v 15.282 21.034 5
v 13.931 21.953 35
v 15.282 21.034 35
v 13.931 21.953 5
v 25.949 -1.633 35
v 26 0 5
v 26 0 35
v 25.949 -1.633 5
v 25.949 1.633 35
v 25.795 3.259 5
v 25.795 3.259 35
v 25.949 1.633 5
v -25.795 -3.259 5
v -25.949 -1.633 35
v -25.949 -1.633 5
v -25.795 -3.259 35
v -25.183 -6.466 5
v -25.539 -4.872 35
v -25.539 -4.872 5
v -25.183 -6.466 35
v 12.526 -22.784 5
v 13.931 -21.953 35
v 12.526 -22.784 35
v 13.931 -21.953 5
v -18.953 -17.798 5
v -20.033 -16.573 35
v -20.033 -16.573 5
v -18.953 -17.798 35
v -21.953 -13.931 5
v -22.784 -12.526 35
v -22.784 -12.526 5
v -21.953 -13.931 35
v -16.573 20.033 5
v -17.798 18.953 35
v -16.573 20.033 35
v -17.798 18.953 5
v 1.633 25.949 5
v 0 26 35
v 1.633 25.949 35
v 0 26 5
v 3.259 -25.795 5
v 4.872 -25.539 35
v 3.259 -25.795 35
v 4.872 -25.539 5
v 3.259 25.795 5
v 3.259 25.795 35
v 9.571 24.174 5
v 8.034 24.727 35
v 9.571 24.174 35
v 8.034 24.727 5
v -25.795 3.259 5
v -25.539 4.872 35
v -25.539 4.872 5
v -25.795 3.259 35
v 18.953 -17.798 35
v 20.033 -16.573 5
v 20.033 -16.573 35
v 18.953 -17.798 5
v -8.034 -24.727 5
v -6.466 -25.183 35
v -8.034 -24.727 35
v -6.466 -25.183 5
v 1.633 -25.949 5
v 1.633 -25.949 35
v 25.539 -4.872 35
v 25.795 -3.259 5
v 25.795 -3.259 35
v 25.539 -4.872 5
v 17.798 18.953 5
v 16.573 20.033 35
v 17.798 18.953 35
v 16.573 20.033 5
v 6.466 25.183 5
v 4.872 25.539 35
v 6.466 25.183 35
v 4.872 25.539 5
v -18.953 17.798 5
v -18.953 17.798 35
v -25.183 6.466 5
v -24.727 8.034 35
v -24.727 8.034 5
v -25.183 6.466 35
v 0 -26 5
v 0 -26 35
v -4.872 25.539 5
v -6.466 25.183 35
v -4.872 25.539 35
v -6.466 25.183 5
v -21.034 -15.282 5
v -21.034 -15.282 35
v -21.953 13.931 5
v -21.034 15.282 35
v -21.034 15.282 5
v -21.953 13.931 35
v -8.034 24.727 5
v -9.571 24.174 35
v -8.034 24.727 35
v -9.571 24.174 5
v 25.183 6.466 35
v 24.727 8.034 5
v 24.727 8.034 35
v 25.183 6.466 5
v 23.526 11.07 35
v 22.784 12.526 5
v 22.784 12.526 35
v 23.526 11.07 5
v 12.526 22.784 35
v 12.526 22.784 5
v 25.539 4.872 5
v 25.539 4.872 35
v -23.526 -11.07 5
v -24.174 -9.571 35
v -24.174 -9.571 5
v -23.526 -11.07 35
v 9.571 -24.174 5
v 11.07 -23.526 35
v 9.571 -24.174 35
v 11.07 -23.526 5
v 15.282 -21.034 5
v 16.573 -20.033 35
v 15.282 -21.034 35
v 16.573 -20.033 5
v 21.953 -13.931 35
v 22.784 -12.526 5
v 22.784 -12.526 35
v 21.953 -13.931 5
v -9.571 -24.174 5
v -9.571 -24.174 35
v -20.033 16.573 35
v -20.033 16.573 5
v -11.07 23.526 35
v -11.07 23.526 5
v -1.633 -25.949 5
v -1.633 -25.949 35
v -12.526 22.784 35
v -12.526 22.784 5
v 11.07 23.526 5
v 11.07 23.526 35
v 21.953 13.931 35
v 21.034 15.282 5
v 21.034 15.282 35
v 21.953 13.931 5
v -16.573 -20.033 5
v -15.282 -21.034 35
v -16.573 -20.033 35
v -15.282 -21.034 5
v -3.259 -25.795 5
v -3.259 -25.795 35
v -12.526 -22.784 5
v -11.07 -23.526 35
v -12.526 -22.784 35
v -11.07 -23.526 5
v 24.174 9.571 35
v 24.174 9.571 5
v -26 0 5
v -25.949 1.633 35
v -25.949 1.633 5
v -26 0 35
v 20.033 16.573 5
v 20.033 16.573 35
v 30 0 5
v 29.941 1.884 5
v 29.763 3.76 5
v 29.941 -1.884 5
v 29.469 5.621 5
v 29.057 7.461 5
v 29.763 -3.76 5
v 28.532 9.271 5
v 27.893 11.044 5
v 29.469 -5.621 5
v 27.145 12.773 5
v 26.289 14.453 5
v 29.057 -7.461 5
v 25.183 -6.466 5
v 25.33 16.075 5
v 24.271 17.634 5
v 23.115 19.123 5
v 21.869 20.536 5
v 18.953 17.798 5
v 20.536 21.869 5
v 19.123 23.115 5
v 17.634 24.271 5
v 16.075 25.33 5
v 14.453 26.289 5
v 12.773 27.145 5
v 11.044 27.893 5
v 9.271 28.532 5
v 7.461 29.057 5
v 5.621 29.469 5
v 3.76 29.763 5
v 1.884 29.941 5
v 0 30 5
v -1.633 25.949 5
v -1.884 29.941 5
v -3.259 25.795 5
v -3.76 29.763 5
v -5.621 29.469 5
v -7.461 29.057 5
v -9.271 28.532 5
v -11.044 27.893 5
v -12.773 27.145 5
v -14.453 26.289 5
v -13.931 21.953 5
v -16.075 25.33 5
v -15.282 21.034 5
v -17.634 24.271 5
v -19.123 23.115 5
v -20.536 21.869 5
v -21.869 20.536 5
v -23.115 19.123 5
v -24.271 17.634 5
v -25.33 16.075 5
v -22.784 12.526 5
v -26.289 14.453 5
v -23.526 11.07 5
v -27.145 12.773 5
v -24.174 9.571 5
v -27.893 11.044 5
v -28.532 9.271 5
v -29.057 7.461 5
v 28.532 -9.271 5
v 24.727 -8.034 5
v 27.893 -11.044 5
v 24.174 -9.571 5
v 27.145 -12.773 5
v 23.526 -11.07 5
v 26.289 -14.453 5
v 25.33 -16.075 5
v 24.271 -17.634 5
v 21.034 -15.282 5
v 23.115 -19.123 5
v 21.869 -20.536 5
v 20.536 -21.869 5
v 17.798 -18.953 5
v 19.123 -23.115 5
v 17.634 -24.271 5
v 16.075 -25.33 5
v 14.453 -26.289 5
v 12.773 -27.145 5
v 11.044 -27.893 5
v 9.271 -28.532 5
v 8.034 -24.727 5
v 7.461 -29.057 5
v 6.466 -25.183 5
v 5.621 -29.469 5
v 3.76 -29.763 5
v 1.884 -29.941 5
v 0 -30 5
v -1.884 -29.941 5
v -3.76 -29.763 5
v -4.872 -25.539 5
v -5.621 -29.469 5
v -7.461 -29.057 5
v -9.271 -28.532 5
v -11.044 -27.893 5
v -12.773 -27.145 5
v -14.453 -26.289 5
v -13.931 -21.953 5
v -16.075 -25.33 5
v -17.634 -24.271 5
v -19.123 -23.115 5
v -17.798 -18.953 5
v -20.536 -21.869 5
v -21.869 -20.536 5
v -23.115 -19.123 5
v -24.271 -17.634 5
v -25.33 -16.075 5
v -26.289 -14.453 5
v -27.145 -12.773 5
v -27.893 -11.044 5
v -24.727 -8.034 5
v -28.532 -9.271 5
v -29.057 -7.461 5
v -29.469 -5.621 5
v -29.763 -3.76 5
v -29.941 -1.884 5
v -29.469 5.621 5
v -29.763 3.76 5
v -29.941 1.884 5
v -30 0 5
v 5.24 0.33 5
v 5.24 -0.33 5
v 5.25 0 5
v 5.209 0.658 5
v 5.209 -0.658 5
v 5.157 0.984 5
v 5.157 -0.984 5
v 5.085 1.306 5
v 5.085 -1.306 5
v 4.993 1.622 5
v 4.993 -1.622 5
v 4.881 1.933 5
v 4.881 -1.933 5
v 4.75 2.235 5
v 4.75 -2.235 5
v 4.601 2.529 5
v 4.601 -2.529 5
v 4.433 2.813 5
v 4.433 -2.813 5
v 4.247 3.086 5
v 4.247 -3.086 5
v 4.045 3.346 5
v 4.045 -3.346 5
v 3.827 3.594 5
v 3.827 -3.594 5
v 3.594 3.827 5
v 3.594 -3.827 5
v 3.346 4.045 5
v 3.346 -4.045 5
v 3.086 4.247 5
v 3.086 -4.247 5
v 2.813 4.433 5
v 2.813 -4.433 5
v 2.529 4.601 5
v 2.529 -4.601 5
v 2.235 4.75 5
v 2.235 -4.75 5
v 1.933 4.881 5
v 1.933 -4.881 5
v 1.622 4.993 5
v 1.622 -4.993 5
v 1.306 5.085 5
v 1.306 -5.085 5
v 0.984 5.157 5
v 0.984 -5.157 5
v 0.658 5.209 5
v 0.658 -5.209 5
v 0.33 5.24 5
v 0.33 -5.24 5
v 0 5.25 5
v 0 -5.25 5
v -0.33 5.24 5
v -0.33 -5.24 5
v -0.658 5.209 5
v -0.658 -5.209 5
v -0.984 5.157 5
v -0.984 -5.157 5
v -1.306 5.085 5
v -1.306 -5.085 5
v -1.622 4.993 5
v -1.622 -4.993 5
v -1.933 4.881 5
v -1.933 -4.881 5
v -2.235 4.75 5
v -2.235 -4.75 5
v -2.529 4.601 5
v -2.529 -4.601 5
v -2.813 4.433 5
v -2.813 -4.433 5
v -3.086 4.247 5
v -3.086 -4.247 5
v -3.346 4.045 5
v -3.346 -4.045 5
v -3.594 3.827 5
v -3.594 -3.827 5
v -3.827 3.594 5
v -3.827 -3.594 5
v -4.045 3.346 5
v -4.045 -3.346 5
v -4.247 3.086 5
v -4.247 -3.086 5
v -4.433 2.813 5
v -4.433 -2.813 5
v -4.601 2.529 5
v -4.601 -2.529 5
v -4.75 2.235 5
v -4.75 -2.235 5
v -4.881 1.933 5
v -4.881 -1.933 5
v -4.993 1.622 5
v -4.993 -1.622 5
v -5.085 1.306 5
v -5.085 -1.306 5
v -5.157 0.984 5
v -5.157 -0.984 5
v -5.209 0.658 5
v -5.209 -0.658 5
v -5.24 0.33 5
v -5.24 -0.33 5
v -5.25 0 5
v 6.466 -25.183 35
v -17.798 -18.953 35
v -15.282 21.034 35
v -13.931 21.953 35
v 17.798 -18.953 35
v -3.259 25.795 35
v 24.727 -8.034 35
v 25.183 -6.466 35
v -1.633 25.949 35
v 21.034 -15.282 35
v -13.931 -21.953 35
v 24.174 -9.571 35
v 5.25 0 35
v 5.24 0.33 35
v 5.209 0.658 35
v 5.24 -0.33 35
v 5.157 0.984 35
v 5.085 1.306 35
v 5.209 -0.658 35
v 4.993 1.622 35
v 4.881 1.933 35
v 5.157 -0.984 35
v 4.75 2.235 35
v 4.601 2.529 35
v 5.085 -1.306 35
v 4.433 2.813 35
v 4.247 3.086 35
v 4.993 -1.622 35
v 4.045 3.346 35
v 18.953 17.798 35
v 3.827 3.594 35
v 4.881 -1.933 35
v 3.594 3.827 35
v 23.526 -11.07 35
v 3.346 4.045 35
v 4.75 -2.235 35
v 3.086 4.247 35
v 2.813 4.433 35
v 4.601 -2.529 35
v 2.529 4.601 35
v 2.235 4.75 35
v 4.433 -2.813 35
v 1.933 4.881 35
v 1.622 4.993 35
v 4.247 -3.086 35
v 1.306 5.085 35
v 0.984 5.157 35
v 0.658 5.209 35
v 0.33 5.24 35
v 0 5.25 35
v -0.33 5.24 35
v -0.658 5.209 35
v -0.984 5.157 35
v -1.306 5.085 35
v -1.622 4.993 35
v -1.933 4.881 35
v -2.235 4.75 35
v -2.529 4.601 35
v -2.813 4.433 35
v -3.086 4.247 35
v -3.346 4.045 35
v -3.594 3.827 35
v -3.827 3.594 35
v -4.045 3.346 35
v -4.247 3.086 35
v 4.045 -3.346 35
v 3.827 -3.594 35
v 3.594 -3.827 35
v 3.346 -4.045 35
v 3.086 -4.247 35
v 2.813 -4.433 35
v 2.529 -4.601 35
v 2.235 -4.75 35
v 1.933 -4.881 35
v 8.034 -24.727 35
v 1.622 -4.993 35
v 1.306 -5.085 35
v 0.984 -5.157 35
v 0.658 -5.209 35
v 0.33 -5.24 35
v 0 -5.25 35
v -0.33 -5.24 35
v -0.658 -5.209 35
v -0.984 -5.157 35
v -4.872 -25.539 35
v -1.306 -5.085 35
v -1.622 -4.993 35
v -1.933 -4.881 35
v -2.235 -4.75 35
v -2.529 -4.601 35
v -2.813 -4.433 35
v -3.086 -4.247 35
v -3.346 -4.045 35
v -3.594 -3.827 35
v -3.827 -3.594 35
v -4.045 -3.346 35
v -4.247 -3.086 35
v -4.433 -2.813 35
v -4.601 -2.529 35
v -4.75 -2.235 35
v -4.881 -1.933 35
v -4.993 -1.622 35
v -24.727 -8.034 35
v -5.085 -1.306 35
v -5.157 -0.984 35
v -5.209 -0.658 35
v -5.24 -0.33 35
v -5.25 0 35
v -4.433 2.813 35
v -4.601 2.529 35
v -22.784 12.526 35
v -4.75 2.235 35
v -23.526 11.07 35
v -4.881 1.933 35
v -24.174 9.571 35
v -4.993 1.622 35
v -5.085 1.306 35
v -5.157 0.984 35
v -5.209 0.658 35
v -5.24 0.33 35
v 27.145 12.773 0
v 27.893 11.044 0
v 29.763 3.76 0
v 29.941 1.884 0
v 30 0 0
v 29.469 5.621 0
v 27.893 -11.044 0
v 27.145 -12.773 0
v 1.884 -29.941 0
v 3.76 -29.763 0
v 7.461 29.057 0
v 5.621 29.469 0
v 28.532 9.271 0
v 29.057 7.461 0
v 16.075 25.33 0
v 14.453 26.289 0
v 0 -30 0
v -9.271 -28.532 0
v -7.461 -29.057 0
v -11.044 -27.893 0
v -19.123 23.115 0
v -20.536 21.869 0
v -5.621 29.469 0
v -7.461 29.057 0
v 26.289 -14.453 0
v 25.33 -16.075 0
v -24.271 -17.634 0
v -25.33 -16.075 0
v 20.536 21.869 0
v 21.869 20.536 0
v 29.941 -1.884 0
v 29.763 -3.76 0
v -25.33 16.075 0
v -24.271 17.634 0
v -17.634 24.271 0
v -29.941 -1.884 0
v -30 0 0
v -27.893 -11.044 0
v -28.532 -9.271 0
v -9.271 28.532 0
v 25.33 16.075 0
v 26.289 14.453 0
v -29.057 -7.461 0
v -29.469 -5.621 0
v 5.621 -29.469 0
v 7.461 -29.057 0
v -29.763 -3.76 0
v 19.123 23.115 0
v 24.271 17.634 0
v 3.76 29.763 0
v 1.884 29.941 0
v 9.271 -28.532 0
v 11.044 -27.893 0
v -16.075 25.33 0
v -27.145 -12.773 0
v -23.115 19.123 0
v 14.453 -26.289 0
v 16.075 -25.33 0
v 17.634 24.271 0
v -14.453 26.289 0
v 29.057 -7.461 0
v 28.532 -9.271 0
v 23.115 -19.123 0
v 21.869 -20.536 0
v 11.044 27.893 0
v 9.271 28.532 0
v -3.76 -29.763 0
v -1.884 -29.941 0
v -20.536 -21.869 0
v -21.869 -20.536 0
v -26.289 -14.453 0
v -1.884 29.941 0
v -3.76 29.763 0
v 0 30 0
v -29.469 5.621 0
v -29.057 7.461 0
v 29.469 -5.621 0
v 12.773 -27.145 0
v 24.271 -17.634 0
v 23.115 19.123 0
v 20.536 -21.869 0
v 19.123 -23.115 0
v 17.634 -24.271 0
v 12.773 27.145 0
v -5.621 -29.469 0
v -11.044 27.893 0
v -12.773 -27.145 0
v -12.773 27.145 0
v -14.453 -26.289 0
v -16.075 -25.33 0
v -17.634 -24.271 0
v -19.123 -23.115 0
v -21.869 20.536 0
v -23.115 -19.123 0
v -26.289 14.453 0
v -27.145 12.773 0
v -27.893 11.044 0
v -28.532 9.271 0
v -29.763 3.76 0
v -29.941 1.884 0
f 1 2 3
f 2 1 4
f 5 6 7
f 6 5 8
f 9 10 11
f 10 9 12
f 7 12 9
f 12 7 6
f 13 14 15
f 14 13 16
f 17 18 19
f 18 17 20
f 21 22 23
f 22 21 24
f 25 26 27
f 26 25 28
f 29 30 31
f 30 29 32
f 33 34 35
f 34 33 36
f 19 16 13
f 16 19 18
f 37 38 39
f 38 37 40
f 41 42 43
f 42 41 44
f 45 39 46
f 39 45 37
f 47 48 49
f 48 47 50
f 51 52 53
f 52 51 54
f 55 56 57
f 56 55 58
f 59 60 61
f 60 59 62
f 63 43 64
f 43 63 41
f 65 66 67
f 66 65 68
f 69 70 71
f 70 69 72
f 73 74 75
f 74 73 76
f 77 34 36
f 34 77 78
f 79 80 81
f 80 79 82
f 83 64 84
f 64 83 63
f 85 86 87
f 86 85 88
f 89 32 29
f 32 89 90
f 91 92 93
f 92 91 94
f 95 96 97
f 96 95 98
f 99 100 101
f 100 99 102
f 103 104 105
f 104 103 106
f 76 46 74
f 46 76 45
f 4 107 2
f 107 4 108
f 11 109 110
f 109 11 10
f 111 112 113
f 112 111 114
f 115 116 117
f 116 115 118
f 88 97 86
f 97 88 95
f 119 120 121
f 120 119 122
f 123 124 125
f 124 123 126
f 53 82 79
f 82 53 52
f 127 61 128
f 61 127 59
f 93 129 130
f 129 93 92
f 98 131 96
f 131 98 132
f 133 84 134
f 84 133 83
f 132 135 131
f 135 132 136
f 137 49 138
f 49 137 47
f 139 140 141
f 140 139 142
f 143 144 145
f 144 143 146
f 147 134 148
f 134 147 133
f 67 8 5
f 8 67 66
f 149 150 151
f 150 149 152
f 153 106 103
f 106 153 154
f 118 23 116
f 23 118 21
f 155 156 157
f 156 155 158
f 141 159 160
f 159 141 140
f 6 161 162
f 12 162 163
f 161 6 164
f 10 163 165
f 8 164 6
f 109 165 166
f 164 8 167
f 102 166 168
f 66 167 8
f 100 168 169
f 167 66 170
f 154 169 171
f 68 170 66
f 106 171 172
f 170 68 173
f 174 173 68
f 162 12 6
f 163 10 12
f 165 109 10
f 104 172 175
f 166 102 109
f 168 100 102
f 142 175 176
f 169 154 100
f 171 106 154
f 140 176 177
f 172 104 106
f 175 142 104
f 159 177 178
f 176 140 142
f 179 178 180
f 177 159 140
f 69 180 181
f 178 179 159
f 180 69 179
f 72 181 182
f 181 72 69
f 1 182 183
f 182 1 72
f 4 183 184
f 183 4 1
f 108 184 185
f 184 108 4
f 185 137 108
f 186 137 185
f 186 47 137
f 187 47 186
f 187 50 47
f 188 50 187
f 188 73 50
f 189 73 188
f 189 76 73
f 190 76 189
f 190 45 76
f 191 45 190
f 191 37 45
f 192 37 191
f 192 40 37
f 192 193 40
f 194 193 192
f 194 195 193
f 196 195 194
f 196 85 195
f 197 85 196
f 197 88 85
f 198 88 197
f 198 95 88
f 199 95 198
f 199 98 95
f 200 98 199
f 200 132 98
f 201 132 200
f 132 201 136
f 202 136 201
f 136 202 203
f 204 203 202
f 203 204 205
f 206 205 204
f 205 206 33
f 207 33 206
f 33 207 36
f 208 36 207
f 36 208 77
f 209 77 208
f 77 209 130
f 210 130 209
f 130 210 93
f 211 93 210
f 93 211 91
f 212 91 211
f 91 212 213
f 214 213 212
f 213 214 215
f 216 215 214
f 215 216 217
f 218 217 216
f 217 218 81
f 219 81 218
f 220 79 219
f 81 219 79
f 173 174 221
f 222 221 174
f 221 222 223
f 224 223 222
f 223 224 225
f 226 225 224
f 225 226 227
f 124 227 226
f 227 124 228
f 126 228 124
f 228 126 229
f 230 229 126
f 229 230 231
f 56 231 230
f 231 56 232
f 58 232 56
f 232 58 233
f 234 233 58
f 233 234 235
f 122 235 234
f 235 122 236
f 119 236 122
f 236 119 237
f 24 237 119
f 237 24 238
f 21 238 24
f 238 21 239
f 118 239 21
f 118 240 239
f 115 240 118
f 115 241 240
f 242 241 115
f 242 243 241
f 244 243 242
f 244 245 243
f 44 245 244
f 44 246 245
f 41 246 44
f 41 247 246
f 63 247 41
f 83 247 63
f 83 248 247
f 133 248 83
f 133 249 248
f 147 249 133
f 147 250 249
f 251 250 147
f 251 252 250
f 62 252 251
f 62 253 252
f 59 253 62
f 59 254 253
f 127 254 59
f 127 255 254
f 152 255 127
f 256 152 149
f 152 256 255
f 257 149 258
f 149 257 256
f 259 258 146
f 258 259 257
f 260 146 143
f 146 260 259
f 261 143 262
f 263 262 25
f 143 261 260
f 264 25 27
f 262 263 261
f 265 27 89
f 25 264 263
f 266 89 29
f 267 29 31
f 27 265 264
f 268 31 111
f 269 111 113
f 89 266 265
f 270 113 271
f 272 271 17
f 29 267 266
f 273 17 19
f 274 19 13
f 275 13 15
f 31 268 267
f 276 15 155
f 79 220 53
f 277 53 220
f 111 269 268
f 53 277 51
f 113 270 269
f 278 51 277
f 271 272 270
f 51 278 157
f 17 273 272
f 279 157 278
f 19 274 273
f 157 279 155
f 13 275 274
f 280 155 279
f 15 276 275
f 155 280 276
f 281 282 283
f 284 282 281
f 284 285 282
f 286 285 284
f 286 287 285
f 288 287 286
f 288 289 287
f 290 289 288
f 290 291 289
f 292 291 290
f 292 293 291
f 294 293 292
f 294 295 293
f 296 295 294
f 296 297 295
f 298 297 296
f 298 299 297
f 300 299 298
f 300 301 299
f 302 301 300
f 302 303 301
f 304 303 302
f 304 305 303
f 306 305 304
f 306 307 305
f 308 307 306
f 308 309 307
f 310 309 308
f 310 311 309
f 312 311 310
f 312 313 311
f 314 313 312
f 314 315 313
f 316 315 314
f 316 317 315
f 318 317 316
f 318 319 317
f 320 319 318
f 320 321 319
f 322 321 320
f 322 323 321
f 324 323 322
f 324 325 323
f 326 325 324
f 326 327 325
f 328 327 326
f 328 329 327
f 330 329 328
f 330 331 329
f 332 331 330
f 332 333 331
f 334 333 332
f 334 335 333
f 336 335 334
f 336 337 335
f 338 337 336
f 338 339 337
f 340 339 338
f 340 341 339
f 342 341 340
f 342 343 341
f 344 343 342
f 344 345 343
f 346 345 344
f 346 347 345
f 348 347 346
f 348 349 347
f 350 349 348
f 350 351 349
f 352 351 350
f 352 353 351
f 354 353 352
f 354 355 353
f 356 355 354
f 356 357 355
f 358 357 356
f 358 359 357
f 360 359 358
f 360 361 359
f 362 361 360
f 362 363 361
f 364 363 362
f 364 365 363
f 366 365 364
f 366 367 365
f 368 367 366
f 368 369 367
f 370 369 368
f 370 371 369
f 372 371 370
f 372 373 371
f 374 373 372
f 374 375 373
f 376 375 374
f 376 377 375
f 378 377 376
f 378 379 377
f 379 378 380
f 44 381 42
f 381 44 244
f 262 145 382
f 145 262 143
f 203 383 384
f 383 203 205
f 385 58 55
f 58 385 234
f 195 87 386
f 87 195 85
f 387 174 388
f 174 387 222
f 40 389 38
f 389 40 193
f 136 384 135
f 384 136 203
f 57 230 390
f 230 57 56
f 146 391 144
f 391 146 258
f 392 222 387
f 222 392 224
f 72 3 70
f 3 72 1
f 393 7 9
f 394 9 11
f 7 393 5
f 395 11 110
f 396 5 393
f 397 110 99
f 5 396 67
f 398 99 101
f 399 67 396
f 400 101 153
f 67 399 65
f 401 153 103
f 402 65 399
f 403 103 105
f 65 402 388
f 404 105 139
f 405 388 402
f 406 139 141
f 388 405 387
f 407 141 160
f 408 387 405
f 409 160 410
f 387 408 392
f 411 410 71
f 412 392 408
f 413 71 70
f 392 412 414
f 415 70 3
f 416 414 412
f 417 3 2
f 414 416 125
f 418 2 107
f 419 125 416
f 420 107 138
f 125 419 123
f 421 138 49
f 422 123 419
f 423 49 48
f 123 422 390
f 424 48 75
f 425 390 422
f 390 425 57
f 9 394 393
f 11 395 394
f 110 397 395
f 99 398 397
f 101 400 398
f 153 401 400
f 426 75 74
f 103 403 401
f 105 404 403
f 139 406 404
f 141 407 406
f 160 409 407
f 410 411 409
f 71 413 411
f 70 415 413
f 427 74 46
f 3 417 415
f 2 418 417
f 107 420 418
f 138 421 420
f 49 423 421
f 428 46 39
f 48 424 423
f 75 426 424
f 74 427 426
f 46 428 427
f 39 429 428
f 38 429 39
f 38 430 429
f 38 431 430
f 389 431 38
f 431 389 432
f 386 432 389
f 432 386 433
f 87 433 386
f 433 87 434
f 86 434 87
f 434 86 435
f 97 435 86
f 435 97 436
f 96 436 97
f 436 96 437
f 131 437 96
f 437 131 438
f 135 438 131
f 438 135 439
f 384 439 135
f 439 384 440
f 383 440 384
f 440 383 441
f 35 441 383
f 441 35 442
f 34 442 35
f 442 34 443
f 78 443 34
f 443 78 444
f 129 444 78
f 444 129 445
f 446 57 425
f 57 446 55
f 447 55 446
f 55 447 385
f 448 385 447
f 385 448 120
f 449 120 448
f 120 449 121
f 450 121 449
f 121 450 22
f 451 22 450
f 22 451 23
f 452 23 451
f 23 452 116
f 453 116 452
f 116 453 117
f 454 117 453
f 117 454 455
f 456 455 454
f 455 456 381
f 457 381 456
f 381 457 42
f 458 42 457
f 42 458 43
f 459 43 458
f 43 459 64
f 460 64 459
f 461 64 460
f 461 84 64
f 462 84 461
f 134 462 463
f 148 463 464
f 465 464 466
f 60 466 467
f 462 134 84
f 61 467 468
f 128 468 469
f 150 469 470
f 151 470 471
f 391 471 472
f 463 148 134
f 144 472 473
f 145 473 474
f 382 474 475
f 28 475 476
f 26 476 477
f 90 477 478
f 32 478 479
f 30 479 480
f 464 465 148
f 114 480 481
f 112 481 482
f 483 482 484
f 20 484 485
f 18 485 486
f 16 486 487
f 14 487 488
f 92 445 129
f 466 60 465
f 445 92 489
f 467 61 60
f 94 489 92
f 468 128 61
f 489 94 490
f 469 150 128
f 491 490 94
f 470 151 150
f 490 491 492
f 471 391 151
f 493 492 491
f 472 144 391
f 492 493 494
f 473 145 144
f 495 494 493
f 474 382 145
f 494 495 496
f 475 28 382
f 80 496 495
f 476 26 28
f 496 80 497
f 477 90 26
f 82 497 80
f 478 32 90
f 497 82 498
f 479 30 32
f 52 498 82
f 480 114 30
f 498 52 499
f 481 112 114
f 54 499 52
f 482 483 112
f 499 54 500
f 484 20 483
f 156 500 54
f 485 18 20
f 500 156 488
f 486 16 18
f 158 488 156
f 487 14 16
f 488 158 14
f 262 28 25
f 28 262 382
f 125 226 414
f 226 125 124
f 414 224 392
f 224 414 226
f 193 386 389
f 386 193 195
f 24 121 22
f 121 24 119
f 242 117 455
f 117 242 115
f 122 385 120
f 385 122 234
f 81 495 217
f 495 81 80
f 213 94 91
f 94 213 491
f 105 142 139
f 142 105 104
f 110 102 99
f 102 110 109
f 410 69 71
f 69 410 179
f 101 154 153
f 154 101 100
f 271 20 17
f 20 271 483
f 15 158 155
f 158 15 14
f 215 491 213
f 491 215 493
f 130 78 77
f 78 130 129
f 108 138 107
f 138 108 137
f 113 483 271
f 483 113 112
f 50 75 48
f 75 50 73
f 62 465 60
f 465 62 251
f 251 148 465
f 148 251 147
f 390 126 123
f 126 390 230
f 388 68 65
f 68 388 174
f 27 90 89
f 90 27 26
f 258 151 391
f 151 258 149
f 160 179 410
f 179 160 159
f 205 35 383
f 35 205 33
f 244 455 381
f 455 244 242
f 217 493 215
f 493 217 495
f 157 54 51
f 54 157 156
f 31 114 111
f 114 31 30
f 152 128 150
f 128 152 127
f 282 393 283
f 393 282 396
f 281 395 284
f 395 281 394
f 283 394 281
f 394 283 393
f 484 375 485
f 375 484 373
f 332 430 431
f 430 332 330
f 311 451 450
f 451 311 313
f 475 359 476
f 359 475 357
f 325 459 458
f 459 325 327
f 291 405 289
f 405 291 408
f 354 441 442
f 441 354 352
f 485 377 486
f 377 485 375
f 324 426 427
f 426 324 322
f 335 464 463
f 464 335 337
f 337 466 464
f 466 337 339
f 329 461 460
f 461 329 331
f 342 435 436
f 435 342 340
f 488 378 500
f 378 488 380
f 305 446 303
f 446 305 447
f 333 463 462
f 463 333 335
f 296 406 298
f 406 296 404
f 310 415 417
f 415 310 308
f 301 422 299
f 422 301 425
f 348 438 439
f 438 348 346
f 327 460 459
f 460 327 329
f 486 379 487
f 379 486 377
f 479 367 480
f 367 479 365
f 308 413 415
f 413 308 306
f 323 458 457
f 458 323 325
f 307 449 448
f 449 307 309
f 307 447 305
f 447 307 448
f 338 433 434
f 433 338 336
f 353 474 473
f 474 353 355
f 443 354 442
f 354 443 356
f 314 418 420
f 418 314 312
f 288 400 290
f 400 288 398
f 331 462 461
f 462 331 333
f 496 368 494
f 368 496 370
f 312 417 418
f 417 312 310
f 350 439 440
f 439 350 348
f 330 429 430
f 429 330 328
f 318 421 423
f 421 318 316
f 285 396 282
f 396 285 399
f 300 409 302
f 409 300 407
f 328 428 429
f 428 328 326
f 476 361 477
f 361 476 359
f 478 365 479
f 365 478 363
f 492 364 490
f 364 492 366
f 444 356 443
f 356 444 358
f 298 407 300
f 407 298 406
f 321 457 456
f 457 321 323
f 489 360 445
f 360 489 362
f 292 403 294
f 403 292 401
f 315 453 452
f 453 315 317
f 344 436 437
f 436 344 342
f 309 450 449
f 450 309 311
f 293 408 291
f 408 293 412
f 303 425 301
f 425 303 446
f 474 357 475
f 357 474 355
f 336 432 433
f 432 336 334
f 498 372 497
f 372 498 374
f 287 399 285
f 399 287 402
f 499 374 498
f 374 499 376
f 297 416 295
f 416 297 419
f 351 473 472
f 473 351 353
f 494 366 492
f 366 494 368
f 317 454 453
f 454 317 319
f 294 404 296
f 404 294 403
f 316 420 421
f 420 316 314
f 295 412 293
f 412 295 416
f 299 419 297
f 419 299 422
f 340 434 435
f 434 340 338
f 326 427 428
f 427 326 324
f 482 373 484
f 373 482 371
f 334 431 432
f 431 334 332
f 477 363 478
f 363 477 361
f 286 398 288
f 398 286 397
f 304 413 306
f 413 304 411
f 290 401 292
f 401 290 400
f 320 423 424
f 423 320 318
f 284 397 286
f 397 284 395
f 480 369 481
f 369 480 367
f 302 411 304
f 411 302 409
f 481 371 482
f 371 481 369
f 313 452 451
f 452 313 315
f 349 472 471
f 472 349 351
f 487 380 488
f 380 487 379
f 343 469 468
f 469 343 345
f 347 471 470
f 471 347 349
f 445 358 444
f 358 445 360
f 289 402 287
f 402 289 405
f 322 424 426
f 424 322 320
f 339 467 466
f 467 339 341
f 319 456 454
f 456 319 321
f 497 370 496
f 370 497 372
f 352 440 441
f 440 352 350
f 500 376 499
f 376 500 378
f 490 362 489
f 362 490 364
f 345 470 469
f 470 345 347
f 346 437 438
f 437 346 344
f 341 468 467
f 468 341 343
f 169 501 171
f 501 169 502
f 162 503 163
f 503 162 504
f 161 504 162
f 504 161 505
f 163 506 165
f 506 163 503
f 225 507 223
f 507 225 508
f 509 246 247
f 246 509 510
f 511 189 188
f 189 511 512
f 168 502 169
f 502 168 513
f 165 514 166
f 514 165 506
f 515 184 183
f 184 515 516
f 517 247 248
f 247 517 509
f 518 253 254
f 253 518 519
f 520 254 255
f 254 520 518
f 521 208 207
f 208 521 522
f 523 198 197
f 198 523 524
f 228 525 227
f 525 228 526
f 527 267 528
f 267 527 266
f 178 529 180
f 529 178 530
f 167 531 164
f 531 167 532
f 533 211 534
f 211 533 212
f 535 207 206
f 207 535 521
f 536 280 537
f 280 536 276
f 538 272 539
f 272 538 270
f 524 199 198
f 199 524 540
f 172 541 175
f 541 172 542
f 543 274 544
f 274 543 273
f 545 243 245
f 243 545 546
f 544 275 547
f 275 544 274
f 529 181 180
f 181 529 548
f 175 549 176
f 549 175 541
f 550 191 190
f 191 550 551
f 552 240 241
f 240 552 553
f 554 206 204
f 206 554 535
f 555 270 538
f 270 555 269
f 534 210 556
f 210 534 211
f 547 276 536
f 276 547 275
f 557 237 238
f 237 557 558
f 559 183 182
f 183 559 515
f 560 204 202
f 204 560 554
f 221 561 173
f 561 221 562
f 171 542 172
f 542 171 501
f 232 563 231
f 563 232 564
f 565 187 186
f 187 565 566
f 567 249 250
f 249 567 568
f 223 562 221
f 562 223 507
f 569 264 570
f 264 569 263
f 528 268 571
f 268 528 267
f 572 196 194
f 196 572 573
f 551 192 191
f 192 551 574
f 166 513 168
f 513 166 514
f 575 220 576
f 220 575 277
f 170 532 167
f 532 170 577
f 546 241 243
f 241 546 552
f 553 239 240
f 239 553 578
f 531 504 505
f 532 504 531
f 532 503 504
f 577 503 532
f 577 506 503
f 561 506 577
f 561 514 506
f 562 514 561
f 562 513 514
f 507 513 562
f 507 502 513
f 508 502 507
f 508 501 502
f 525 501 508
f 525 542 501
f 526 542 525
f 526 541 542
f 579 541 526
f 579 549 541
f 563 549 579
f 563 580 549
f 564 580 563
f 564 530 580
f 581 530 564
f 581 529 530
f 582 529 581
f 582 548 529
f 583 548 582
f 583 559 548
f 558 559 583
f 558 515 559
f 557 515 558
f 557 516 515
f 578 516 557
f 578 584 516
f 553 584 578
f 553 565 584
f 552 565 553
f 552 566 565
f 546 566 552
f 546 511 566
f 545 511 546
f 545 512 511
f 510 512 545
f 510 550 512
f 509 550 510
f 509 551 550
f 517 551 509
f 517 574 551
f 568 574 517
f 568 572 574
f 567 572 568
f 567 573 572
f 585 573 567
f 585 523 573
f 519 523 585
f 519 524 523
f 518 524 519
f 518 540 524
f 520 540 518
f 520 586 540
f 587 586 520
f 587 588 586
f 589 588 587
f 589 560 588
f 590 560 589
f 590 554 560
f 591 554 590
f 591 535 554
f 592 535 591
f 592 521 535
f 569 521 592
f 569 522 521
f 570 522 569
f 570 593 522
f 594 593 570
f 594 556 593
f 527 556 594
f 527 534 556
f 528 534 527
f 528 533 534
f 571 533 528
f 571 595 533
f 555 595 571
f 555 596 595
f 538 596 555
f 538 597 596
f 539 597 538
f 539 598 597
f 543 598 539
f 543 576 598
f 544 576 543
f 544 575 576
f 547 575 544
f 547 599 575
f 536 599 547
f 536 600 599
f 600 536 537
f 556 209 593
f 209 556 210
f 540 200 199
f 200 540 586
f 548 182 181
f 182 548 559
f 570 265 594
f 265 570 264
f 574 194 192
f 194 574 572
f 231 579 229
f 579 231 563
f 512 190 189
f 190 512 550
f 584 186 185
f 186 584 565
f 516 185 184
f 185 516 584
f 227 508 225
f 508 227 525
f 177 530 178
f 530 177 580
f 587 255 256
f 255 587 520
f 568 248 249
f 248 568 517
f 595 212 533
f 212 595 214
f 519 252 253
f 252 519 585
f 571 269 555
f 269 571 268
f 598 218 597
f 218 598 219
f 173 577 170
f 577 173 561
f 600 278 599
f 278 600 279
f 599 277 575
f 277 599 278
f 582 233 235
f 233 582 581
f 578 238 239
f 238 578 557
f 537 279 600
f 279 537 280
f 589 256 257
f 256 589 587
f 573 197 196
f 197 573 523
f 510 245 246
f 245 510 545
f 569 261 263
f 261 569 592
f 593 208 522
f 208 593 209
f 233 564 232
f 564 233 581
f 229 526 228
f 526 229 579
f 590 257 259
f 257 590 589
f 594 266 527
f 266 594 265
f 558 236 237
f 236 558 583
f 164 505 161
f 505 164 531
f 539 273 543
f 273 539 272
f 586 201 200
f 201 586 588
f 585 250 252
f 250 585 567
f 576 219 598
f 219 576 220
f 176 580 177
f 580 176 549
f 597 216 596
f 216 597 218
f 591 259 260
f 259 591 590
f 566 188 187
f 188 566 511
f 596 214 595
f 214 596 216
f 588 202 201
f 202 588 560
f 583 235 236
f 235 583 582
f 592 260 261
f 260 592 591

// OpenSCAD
$fn = 100;

// Main cylinder parameters
main_height = 30;        // Height in mm (3cm)
main_diameter = 52;      // Diameter in mm

// Base cylinder parameters
base_height = 5;         // Thickness in mm
base_diameter = 60;      // Diameter in mm

// Hole parameters
hole_depth = 30;         // Depth in mm (3cm)
hole_diameter = 10.5;    // Diameter in mm

cylinder(h=base_height, d=base_diameter, center=false);

translate([0, 0, base_height])
    difference() {
        cylinder(h=main_height, d=main_diameter, center=false);
        cylinder(h=hole_depth, d=hole_diameter, center=false);
    }
